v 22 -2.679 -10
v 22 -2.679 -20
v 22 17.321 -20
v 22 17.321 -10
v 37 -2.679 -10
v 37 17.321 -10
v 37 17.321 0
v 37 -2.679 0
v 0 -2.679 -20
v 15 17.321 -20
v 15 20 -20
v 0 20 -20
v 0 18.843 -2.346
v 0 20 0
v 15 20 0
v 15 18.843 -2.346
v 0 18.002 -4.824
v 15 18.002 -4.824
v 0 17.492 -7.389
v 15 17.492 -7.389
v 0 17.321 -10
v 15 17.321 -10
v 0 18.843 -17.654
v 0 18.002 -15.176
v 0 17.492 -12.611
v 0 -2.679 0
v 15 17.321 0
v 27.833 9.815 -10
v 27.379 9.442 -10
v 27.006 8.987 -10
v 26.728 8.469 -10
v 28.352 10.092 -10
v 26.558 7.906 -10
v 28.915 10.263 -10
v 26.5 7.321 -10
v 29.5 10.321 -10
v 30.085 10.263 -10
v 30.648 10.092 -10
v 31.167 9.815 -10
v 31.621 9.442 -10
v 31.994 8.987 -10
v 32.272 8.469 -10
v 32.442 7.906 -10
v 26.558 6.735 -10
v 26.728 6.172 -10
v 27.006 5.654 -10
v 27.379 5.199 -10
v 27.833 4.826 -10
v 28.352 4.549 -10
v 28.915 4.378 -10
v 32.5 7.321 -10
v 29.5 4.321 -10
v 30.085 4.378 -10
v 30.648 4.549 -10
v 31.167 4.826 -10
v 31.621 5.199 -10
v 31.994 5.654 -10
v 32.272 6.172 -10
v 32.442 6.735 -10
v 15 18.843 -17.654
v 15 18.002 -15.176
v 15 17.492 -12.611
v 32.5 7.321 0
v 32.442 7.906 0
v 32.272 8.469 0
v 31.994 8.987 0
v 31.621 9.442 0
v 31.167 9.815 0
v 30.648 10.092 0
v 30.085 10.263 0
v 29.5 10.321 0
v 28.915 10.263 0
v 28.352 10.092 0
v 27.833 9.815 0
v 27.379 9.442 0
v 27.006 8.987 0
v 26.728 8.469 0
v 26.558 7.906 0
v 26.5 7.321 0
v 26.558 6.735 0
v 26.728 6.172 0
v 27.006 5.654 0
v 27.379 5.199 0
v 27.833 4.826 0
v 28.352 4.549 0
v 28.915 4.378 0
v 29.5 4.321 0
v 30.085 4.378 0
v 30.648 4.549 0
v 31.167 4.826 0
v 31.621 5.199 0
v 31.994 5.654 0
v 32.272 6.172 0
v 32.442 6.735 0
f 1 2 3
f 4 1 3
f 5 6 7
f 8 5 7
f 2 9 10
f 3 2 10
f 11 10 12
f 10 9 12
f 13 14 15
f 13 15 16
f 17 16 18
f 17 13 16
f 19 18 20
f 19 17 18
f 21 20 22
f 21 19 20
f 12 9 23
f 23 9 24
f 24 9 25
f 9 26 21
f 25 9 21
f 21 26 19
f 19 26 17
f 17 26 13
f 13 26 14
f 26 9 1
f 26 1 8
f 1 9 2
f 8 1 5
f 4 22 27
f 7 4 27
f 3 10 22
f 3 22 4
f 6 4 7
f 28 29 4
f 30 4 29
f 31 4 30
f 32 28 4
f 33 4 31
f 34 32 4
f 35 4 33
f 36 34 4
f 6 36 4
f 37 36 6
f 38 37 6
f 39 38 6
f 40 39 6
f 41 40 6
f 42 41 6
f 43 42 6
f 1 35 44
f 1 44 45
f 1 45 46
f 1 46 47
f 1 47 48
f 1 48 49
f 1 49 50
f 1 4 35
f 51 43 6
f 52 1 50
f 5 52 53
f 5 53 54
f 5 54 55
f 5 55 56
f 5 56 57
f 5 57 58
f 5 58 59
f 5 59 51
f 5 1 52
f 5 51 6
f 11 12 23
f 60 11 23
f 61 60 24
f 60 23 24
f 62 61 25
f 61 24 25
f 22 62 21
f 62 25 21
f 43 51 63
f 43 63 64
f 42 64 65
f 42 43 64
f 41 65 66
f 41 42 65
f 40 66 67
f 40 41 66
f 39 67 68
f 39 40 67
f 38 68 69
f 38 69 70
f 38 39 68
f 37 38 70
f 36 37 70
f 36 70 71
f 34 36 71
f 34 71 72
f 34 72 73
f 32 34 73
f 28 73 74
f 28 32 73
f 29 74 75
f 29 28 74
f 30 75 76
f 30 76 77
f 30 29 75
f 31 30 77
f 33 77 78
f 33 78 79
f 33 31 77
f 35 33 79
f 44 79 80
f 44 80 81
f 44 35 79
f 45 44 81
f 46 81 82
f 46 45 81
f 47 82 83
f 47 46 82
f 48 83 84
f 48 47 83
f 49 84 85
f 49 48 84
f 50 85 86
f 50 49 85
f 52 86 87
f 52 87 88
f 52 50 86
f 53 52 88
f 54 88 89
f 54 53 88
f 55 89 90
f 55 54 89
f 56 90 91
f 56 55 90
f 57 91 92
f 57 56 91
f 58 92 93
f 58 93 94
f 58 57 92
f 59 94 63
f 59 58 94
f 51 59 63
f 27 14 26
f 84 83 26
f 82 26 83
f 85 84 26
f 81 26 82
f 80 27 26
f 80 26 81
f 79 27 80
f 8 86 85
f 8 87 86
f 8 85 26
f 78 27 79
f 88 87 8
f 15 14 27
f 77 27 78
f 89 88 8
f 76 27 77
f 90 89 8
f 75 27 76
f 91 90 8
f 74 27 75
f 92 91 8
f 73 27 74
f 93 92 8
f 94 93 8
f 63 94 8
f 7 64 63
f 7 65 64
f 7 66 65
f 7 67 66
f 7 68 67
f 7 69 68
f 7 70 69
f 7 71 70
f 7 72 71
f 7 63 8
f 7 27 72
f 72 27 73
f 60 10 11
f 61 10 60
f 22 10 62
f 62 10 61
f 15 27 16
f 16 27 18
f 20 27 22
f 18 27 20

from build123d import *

# Parameters (mm, degrees)
CROQUIS2_W                  = 37
CROQUIS2_H                  = 20
SALIENTE_EXTRUIR2_DEPTH     = 20
CORTAR_EXTRUIR2_DEPTH       = 47.572524089
CORTAR_EXTRUIR2_DEPTH_BACK  = 47.572524089
CROQUIS3_W                  = 15
CROQUIS3_H                  = 10
CROQUIS4_R                  = 3
CORTAR_EXTRUIR3_DEPTH       = 44.231932642
CROQUIS8_W                  = 15
CROQUIS8_H                  = 20
SALIENTE_EXTRUIR4_DEPTH     = 2.679491924
CORTAR_EXTRUIR10_DEPTH      = 36.832945734
CORTAR_EXTRUIR10_DEPTH_BACK = 36.832945734
MOVER_START                 = -20
MOVER_CARA2_DEPTH           = 10
MOVER_START_2               = -10
MOVER_CARA2_2_OUTLINE_W     = 22
MOVER_CARA2_2_OUTLINE_H     = 2.679491924
MOVER_CARA2_2_OUTLINE_R     = 3
MOVER_CARA2_2_DEPTH         = 10
MOVER_CARA2_3_OUTLINE_R     = 3
MOVER_CARA2_3_DEPTH         = 10
MOVER_CARA2_4_OUTLINE_W     = 22
MOVER_CARA2_4_OUTLINE_H     = 2.679491924
MOVER_CARA2_4_OUTLINE_R     = 3
MOVER_CARA2_4_DEPTH         = 10
MOVER_CARA2_5_DEPTH         = 15
MOVER_CARA2_6_DEPTH         = 15


with BuildPart() as part:
    # Croquis2 → Saliente-Extruir2 (new body)
    with BuildSketch(Plane(origin=(0, 0, 0), x_dir=(1, 0, 0), z_dir=(0, 1, 0))):
        with Locations((18.5, 10)):
            Rectangle(CROQUIS2_W, CROQUIS2_H)
    extrude(amount=SALIENTE_EXTRUIR2_DEPTH)

    # Croquis3 → Cortar-Extruir2 (cut, two sides: drawn at the far end of the back side and taken through both)
    with BuildSketch(Plane(origin=(0, 0, 0), x_dir=(1, 0, 0), z_dir=(0, 1, 0)).offset(-CORTAR_EXTRUIR2_DEPTH_BACK)):
        with Locations((7.5, 15)):
            Rectangle(CROQUIS3_W, CROQUIS3_H)
    extrude(amount=CORTAR_EXTRUIR2_DEPTH + CORTAR_EXTRUIR2_DEPTH_BACK, mode=Mode.SUBTRACT)

    # Croquis4 → Cortar-Extruir3 (cut, through all)
    with BuildSketch(Plane(origin=(0, 0, -10), x_dir=(-1, 0, 0), z_dir=(0, 0, -1))):
        with Locations((-7.5, 10)):
            Circle(CROQUIS4_R)
    extrude(amount=-CORTAR_EXTRUIR3_DEPTH, mode=Mode.SUBTRACT)

    # Croquis8 → Saliente-Extruir4 (add)
    with BuildSketch(Plane.XZ):
        with Locations((29.5, -10)):
            Rectangle(CROQUIS8_W, CROQUIS8_H)
    extrude(amount=SALIENTE_EXTRUIR4_DEPTH)

    # Croquis9 → Cortar-Extruir10 (cut, two sides: drawn at the far end of the back side and taken through both)
    with BuildSketch(Plane.ZY.offset(-22).offset(-CORTAR_EXTRUIR10_DEPTH_BACK)):
        with BuildLine():
            Line((-81.034656774, -37.917867438), (-20, -2.679491924))
            ThreePointArc((-20, -2.679491924), (-10, 0), (0, -2.679491924))
            Line((0, -2.679491924), (61.034656774, -37.917867438))
            Line((61.034656774, -37.917867438), (61.034656774, -178.871369507))
            Line((61.034656774, -178.871369507), (-81.034656774, -178.871369507))
            Line((-81.034656774, -178.871369507), (-81.034656774, -37.917867438))
        make_face()
    extrude(amount=CORTAR_EXTRUIR10_DEPTH + CORTAR_EXTRUIR10_DEPTH_BACK, mode=Mode.SUBTRACT)

    # Mover cara2: read off the stored shape, not the designer's step
    # Mover cara2 outline → Mover cara2 (cut)
    with BuildSketch(Plane.XY.offset(MOVER_START)):
        Polygon((15, 20), (15, 17.320508076), (22, 17.320508076), (22, -2.679491924), (37, -2.679491924), (37, 20), align=None)
    extrude(amount=MOVER_CARA2_DEPTH, mode=Mode.SUBTRACT)

    # Mover cara2 2 outline → Mover cara2 2 (cut)
    with BuildSketch(Plane.XY.offset(MOVER_START_2)):
        with Locations((26, 18.660254038)):
            Rectangle(MOVER_CARA2_2_OUTLINE_W, MOVER_CARA2_2_OUTLINE_H)
        with Locations((29.5, 7.320508076)):
            Circle(MOVER_CARA2_2_OUTLINE_R)
    extrude(amount=MOVER_CARA2_2_DEPTH, mode=Mode.SUBTRACT)

    # Mover cara2 3 outline → Mover cara2 3 (add)
    # profile 1 of 2: a face of its own
    with BuildSketch(Plane.XY.offset(MOVER_START_2)):
        Polygon((37, 17.320508076), (22, 17.320508076), (22, 0), (0, 0), (0, -2.679491924), (37, -2.679491924), align=None)
        with Locations((29.5, 7.320508076)):
            Circle(MOVER_CARA2_3_OUTLINE_R, mode=Mode.SUBTRACT)
    # profile 2 of 2: a face of its own
    with BuildSketch(Plane.XY.offset(MOVER_START_2)):
        with Locations((7.5, 10)):
            Circle(MOVER_CARA2_3_OUTLINE_R)
    extrude(amount=MOVER_CARA2_3_DEPTH)

    # Mover cara2 4 outline → Mover cara2 4 (add)
    with BuildSketch(Plane.XY.offset(MOVER_START)):
        with Locations((11, -1.339745962)):
            Rectangle(MOVER_CARA2_4_OUTLINE_W, MOVER_CARA2_4_OUTLINE_H)
        with Locations((7.5, 10)):
            Circle(MOVER_CARA2_4_OUTLINE_R)
    extrude(amount=MOVER_CARA2_4_DEPTH)

    # Mover cara2 5 outline → Mover cara2 5 (cut)
    with BuildSketch(Plane.YZ):
        with BuildLine():
            ThreePointArc((20, 0), (18.00199155, -4.823619098), (17.320508076, -10))
            Line((17.320508076, -10), (20, -10))
            Line((20, -10), (20, 0))
        make_face()
    extrude(amount=MOVER_CARA2_5_DEPTH, mode=Mode.SUBTRACT)

    # Mover cara2 6 outline → Mover cara2 6 (add)
    with BuildSketch(Plane.YZ):
        with BuildLine():
            Line((0, -20), (20, -20))
            ThreePointArc((20, -20), (18.00199155, -15.176380902), (17.320508076, -10))
            Line((17.320508076, -10), (0, -10))
            Line((0, -10), (0, -20))
        make_face()
    extrude(amount=MOVER_CARA2_6_DEPTH)


solid = part.part
